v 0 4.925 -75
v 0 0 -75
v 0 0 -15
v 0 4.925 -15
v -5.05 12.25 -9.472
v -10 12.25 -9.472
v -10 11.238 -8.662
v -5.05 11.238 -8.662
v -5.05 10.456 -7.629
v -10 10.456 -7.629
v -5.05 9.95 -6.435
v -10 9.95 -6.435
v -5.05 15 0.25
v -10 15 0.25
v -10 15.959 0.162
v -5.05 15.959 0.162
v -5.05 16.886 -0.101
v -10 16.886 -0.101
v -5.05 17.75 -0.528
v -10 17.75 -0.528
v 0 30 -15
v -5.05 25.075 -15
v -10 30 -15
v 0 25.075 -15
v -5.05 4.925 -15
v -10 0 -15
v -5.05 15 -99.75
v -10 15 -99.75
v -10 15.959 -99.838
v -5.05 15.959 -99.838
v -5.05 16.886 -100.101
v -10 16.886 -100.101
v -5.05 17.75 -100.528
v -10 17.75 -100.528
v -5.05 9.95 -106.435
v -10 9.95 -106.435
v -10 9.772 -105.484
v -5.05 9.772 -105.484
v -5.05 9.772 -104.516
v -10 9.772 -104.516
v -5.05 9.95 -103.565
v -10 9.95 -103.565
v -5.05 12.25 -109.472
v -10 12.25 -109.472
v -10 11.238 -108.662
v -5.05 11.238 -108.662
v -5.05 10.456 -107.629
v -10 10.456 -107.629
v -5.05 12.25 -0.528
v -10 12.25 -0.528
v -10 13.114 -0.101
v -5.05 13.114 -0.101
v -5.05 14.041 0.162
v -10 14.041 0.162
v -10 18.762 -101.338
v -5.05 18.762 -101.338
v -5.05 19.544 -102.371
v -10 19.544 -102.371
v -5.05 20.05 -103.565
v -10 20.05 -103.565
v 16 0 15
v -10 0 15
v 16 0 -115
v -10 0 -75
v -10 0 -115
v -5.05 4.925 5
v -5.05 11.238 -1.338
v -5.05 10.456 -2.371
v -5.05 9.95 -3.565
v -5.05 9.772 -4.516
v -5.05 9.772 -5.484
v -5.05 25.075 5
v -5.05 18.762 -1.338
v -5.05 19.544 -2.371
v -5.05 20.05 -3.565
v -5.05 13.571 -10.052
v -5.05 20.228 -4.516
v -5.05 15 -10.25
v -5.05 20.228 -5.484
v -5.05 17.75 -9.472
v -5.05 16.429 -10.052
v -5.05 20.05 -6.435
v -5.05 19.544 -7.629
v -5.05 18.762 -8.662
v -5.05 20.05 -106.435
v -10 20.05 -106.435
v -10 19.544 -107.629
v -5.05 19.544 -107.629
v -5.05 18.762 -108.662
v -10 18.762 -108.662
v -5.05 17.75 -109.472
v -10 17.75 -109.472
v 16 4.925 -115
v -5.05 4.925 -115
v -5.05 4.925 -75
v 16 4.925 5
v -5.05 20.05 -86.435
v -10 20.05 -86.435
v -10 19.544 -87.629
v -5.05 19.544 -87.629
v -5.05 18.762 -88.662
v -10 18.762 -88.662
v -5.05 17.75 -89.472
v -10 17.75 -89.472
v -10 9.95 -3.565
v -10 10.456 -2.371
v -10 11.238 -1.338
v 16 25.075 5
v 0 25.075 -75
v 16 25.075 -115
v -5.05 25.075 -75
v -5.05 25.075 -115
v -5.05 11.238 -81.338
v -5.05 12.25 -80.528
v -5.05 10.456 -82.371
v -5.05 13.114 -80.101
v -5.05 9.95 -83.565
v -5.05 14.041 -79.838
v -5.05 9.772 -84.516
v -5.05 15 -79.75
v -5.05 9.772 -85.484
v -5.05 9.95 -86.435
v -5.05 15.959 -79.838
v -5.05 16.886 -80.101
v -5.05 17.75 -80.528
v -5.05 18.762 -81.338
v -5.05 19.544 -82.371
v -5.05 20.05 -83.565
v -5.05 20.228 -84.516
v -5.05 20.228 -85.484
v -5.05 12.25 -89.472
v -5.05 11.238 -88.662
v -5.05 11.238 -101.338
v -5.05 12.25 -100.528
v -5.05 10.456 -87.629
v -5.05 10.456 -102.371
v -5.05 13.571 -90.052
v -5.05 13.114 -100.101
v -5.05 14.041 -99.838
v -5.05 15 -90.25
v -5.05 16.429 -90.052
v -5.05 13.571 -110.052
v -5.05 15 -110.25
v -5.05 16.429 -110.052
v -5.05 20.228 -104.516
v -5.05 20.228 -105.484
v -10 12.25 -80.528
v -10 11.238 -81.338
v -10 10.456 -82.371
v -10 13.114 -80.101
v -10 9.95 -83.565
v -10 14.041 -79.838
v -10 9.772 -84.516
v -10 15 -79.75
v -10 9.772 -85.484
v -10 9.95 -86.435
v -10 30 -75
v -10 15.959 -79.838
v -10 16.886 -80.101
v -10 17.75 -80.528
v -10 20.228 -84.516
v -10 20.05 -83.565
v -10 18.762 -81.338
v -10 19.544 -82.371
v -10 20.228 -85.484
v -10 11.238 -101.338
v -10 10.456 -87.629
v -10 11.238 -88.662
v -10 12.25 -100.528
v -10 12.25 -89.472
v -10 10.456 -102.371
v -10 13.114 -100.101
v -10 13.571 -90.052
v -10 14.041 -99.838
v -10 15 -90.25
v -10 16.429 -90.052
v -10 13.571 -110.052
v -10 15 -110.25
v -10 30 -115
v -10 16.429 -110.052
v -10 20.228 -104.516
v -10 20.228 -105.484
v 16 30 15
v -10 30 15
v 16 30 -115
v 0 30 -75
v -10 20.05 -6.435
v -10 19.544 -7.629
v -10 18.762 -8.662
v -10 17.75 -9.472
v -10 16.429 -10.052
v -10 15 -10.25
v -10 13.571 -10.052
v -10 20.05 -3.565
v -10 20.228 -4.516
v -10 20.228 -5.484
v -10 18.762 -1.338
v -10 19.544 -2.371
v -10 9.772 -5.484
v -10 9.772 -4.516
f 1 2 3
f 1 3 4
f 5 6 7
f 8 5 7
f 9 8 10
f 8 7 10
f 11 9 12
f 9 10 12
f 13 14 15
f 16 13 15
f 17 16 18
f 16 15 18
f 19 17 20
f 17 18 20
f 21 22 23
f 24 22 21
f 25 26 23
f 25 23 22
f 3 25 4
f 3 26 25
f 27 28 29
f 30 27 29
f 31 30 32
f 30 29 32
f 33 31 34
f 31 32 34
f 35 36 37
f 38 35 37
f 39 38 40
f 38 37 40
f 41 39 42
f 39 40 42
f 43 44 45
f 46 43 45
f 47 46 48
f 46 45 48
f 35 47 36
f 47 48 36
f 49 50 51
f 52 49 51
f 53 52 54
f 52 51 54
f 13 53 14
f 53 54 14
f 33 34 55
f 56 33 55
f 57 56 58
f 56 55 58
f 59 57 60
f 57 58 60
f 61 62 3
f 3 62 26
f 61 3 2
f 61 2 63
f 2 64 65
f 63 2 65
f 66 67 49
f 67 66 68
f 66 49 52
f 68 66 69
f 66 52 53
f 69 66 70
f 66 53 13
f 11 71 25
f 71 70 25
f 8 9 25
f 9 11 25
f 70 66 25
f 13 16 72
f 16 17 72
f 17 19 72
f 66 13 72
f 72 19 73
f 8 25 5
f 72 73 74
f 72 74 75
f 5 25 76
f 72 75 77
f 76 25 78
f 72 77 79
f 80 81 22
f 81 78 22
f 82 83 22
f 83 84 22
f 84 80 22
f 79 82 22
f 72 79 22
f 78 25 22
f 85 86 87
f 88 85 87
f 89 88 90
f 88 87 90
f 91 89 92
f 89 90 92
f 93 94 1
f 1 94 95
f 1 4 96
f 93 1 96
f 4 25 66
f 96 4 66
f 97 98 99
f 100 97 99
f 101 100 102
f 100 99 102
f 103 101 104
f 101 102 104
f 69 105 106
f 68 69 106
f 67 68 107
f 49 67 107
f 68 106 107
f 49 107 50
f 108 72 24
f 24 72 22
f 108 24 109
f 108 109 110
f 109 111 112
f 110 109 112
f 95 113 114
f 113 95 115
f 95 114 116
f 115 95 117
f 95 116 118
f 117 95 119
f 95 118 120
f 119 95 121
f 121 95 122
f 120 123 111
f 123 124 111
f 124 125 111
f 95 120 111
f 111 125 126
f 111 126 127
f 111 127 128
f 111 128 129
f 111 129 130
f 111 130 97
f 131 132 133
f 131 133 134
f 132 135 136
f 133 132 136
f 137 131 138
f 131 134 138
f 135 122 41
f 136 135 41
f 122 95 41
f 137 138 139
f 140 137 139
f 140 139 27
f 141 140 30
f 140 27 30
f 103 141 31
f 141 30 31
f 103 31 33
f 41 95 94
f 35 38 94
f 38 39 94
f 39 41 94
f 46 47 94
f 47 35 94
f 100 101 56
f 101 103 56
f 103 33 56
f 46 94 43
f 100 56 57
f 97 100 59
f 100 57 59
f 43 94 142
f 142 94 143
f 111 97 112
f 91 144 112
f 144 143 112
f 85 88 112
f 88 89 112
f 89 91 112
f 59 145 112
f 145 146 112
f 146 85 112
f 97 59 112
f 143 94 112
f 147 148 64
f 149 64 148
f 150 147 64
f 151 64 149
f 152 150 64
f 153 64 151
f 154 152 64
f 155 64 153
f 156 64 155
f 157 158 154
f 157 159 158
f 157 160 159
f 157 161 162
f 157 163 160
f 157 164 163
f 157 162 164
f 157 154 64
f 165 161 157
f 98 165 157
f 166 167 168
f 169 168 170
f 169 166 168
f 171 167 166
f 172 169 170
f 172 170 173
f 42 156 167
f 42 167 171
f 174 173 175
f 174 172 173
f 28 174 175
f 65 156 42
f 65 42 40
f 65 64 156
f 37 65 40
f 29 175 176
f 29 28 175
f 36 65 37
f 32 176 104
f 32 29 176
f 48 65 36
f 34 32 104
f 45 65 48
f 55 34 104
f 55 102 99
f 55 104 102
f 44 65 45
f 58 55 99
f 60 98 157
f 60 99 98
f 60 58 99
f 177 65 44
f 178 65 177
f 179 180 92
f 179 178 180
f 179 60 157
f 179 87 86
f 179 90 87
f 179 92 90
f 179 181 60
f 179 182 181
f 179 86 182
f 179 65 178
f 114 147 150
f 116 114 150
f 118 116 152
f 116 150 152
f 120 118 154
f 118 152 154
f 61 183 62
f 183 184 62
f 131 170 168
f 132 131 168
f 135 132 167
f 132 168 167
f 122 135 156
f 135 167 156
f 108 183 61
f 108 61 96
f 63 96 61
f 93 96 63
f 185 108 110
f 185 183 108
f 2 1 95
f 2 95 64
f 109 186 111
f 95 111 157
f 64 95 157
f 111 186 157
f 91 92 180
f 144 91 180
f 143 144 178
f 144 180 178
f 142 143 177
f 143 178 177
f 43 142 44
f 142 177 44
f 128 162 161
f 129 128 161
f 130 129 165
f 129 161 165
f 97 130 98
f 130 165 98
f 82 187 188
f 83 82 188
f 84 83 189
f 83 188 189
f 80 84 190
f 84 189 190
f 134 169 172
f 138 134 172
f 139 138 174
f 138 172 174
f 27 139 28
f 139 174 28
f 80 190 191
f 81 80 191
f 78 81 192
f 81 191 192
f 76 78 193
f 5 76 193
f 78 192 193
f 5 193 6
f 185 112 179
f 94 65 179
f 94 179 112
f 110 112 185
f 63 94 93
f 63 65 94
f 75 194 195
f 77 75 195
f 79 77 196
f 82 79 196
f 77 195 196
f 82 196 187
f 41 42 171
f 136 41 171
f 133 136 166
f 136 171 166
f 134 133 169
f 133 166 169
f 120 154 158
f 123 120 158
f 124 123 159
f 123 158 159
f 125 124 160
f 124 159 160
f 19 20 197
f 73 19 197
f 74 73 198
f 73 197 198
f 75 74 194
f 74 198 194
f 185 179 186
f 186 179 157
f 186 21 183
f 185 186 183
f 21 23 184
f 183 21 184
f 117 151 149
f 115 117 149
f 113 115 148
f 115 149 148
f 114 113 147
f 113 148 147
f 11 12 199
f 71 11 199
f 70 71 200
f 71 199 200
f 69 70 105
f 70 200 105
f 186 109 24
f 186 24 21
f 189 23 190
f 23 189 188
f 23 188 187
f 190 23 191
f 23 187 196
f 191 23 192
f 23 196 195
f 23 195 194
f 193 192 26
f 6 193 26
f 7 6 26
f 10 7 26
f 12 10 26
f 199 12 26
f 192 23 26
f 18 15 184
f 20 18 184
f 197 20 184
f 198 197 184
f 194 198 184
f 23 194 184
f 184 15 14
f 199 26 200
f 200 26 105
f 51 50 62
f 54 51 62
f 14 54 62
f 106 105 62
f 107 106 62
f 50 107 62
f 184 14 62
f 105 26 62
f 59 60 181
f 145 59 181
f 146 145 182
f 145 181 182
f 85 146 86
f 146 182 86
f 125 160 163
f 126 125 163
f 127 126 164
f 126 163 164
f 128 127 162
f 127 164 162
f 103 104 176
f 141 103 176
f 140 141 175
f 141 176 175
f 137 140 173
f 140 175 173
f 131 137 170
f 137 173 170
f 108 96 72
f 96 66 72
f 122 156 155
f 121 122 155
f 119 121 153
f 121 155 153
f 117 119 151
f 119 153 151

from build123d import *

# Parameters (mm, degrees)
SKETCH_1_W          = 30
SKETCH_1_H          = 30
EXTRUDE_1_DEPTH     = 30
SKETCH_2_W          = 20
SKETCH_2_H          = 20.05
CUT_EXTRUDE_1_DEPTH = 20
CUT_EXTRUDE_2_DEPTH = 20
SKETCH_4_W          = 5
SKETCH_4_H          = 30
CUT_EXTRUDE_3_DEPTH = 55
SKETCH_5_W          = 15
SKETCH_5_H          = 4.975
EXTRUDE_2_DEPTH     = 120
EXTRUDE_3_DEPTH     = 60
SKETCH_7_R          = 3.1
CUT_EXTRUDE_4_DEPTH = 60
CUT_EXTRUDE_5_REACH = 155.704
SKETCH_8_W          = 20.1
SKETCH_8_H          = 20.15
EXTRUDE_4_DEPTH     = 1
SKETCH_10_R         = 3.1
CUT_EXTRUDE_6_DEPTH = 10
SKETCH_12_W         = 26
SKETCH_12_H         = 20
CUT_EXTRUDE_8_DEPTH = 87


with BuildPart() as part:
    # 草图1 → 凸台-拉伸1 (new body)
    with BuildSketch(Plane(origin=(0, 0, 0), x_dir=(1, 0, 0), z_dir=(0, 1, 0))):
        Rectangle(SKETCH_1_W, SKETCH_1_H)
    extrude(amount=EXTRUDE_1_DEPTH)

    # 草图2 → 切除-拉伸1 (cut)
    with BuildSketch(Plane(origin=(15, 0, 0), x_dir=(0, 0, -1), z_dir=(1, 0, 0))):
        with Locations((5, 15)):
            Rectangle(SKETCH_2_W, SKETCH_2_H)
    extrude(amount=-CUT_EXTRUDE_1_DEPTH, mode=Mode.SUBTRACT)

    # 草图3 → 切除-拉伸2 (cut)
    with BuildSketch(Plane(origin=(-5, 0, 0), x_dir=(0, 0, -1), z_dir=(1, 0, 0))):
        with BuildLine():
            ThreePointArc((7.189292698, 17.194765929), (5, 18.1), (2.810707302, 17.194765929))
            Line((2.810707302, 17.194765929), (5, 15))
            Line((5, 15), (7.189292698, 17.194765929))
        make_face()
        with BuildLine():
            Line((5, 15), (2.810707302, 17.194765929))
            ThreePointArc((2.810707302, 17.194765929), (1.9, 15), (2.810707302, 12.805234071))
            Line((2.810707302, 12.805234071), (5, 15))
        make_face()
        with BuildLine():
            Line((7.189292698, 17.194765929), (5, 15))
            Line((5, 15), (7.189292698, 12.805234071))
            ThreePointArc((7.189292698, 12.805234071), (7.86328547, 13.81189381), (8.1, 15))
            ThreePointArc((8.1, 15), (7.86328547, 16.18810619), (7.189292698, 17.194765929))
        make_face()
        with BuildLine():
            Line((7.189292698, 12.805234071), (5, 15))
            Line((5, 15), (2.810707302, 12.805234071))
            ThreePointArc((2.810707302, 12.805234071), (5, 11.9), (7.189292698, 12.805234071))
        make_face()
        with BuildLine():
            ThreePointArc((7.189292698, 17.194765929), (5, 18.1), (2.810707302, 17.194765929))
            Line((2.810707302, 17.194765929), (5, 15))
            Line((5, 15), (7.189292698, 17.194765929))
        make_face()
        with BuildLine():
            Line((5, 15), (2.810707302, 17.194765929))
            ThreePointArc((2.810707302, 17.194765929), (1.9, 15), (2.810707302, 12.805234071))
            Line((2.810707302, 12.805234071), (5, 15))
        make_face()
        with BuildLine():
            Line((7.189292698, 17.194765929), (5, 15))
            Line((5, 15), (7.189292698, 12.805234071))
            ThreePointArc((7.189292698, 12.805234071), (7.86328547, 13.81189381), (8.1, 15))
            ThreePointArc((8.1, 15), (7.86328547, 16.18810619), (7.189292698, 17.194765929))
        make_face()
        with BuildLine():
            Line((7.189292698, 12.805234071), (5, 15))
            Line((5, 15), (2.810707302, 12.805234071))
            ThreePointArc((2.810707302, 12.805234071), (5, 11.9), (7.189292698, 12.805234071))
        make_face()
        with BuildLine():
            ThreePointArc((7.189292698, 17.194765929), (5, 18.1), (2.810707302, 17.194765929))
            Line((2.810707302, 17.194765929), (5, 15))
            Line((5, 15), (7.189292698, 17.194765929))
        make_face()
        with BuildLine():
            Line((5, 15), (2.810707302, 17.194765929))
            ThreePointArc((2.810707302, 17.194765929), (1.9, 15), (2.810707302, 12.805234071))
            Line((2.810707302, 12.805234071), (5, 15))
        make_face()
        with BuildLine():
            Line((7.189292698, 17.194765929), (5, 15))
            Line((5, 15), (7.189292698, 12.805234071))
            ThreePointArc((7.189292698, 12.805234071), (7.86328547, 13.81189381), (8.1, 15))
            ThreePointArc((8.1, 15), (7.86328547, 16.18810619), (7.189292698, 17.194765929))
        make_face()
        with BuildLine():
            Line((7.189292698, 12.805234071), (5, 15))
            Line((5, 15), (2.810707302, 12.805234071))
            ThreePointArc((2.810707302, 12.805234071), (5, 11.9), (7.189292698, 12.805234071))
        make_face()
        with BuildLine():
            ThreePointArc((7.189292698, 17.194765929), (5, 18.1), (2.810707302, 17.194765929))
            Line((2.810707302, 17.194765929), (5, 15))
            Line((5, 15), (7.189292698, 17.194765929))
        make_face()
        with BuildLine():
            Line((5, 15), (2.810707302, 17.194765929))
            ThreePointArc((2.810707302, 17.194765929), (1.9, 15), (2.810707302, 12.805234071))
            Line((2.810707302, 12.805234071), (5, 15))
        make_face()
        with BuildLine():
            Line((7.189292698, 17.194765929), (5, 15))
            Line((5, 15), (7.189292698, 12.805234071))
            ThreePointArc((7.189292698, 12.805234071), (7.86328547, 13.81189381), (8.1, 15))
            ThreePointArc((8.1, 15), (7.86328547, 16.18810619), (7.189292698, 17.194765929))
        make_face()
        with BuildLine():
            Line((7.189292698, 12.805234071), (5, 15))
            Line((5, 15), (2.810707302, 12.805234071))
            ThreePointArc((2.810707302, 12.805234071), (5, 11.9), (7.189292698, 12.805234071))
        make_face()
    extrude(amount=-CUT_EXTRUDE_2_DEPTH, mode=Mode.SUBTRACT)

    # 草图4 → 切除-拉伸3 (cut)
    with BuildSketch(Plane.XZ):
        with Locations((-12.5, 0)):
            Rectangle(SKETCH_4_W, SKETCH_4_H)
    extrude(amount=-CUT_EXTRUDE_3_DEPTH, mode=Mode.SUBTRACT)

    # 草图5 → 凸台-拉伸2 (add)
    with BuildSketch(Plane(origin=(0, 0, -15), x_dir=(-1, 0, 0), z_dir=(0, 0, -1))):
        with Locations((-7.5, 27.5125)):
            Rectangle(SKETCH_5_W, SKETCH_5_H)
        with Locations((-7.5, 2.4875)):
            Rectangle(SKETCH_5_W, SKETCH_5_H)
    extrude(amount=EXTRUDE_2_DEPTH)

    # 草图6 → 凸台-拉伸3 (add)
    with BuildSketch(Plane(origin=(0, 0, -135), x_dir=(-1, 0, 0), z_dir=(0, 0, -1))):
        Polygon((5, 4.975), (0, 4.975), (0, 0), (10, 0), (10, 30), (0, 30), (0, 25.025), (5, 25.025), align=None)
    extrude(amount=-EXTRUDE_3_DEPTH)

    # 草图7 → 切除-拉伸4 (cut)
    with BuildSketch(Plane.ZY.offset(10)):
        with Locations((-85, 15)):
            Circle(SKETCH_7_R)
    extrude(amount=-CUT_EXTRUDE_4_DEPTH, mode=Mode.SUBTRACT)

    # 切除-拉伸5: up to this face of the body (flat: up to its plane)
    cut_extrude_5_end = Plane(part.part.faces().sort_by_distance((5, 15, 5))[0])
    # 草图8 → 切除-拉伸5 (cut, up to the picked face)
    with BuildSketch(Plane(origin=(0, 0, -135), x_dir=(-1, 0, 0), z_dir=(0, 0, -1)), mode=Mode.PRIVATE) as cut_extrude_5_sk1:
        with Locations((-5, 15)):
            Rectangle(SKETCH_8_W, SKETCH_8_H)
    cut_extrude_5_tool1 = split(extrude(cut_extrude_5_sk1.sketch, amount=-CUT_EXTRUDE_5_REACH, mode=Mode.PRIVATE), bisect_by=cut_extrude_5_end, keep=Keep.BOTH, mode=Mode.PRIVATE)
    add(cut_extrude_5_tool1.solids().sort_by(Axis((5, 15, -135), (0, 0, 1)))[0], mode=Mode.SUBTRACT)

    # 草图9 → 凸台-拉伸4 (add)
    with BuildSketch(Plane(origin=(15, 0, 0), x_dir=(0, 0, -1), z_dir=(1, 0, 0))):
        Polygon((135, 4.925), (-5, 4.925), (-5, 25.075), (135, 25.075), (135, 30), (-15, 30), (-15, 0), (135, 0), align=None)
    extrude(amount=EXTRUDE_4_DEPTH)

    # 草图10 → 切除-拉伸6 (cut)
    # profile 1 of 9: a face of its own
    with BuildSketch(Plane.ZY.offset(10)):
        with BuildLine():
            ThreePointArc((-99.75, 15), (-99.948207558, 16.428948256), (-100.527864045, 17.75))
            ThreePointArc((-100.527864045, 17.75), (-101.830321577, 19.185168897), (-103.564729991, 20.05))
            Line((-103.564729991, 20.05), (-106.435270009, 20.05))
            ThreePointArc((-106.435270009, 20.05), (-108.169678423, 19.185168897), (-109.472135955, 17.75))
            ThreePointArc((-109.472135955, 17.75), (-110.25, 15), (-109.472135955, 12.25))
            ThreePointArc((-109.472135955, 12.25), (-108.169678423, 10.814831103), (-106.435270009, 9.95))
            Line((-106.435270009, 9.95), (-103.564729991, 9.95))
            ThreePointArc((-103.564729991, 9.95), (-101.830321577, 10.814831103), (-100.527864045, 12.25))
            ThreePointArc((-100.527864045, 12.25), (-99.948207558, 13.571051744), (-99.75, 15))
        make_face()
    # profile 2 of 9: a face of its own
    with BuildSketch(Plane.ZY.offset(10)):
        with BuildLine():
            Line((-106.435270009, 20.05), (-103.564729991, 20.05))
            ThreePointArc((-103.564729991, 20.05), (-105, 20.25), (-106.435270009, 20.05))
        make_face()
    # profile 3 of 9: a face of its own
    with BuildSketch(Plane.ZY.offset(10)):
        with BuildLine():
            ThreePointArc((-106.435270009, 9.95), (-105, 9.75), (-103.564729991, 9.95))
            Line((-103.564729991, 9.95), (-106.435270009, 9.95))
        make_face()
    # profile 4 of 9: a face of its own
    with BuildSketch(Plane.ZY.offset(10)):
        with BuildLine():
            ThreePointArc((-79.75, 15), (-79.948207558, 16.428948256), (-80.527864045, 17.75))
            ThreePointArc((-80.527864045, 17.75), (-81.830321577, 19.185168897), (-83.564729991, 20.05))
            Line((-83.564729991, 20.05), (-86.435270009, 20.05))
            ThreePointArc((-86.435270009, 20.05), (-88.169678423, 19.185168897), (-89.472135955, 17.75))
            ThreePointArc((-89.472135955, 17.75), (-90.25, 15), (-89.472135955, 12.25))
            ThreePointArc((-89.472135955, 12.25), (-88.169678423, 10.814831103), (-86.435270009, 9.95))
            Line((-86.435270009, 9.95), (-83.564729991, 9.95))
            ThreePointArc((-83.564729991, 9.95), (-81.830321577, 10.814831103), (-80.527864045, 12.25))
            ThreePointArc((-80.527864045, 12.25), (-79.948207558, 13.571051744), (-79.75, 15))
        make_face()
        with Locations((-85, 15)):
            Circle(SKETCH_10_R, mode=Mode.SUBTRACT)
    # profile 5 of 9: a face of its own
    with BuildSketch(Plane.ZY.offset(10)):
        with BuildLine():
            Line((-86.435270009, 20.05), (-83.564729991, 20.05))
            ThreePointArc((-83.564729991, 20.05), (-85, 20.25), (-86.435270009, 20.05))
        make_face()
    # profile 6 of 9: a face of its own
    with BuildSketch(Plane.ZY.offset(10)):
        with BuildLine():
            ThreePointArc((-86.435270009, 9.95), (-85, 9.75), (-83.564729991, 9.95))
            Line((-83.564729991, 9.95), (-86.435270009, 9.95))
        make_face()
    # profile 7 of 9: a face of its own
    with BuildSketch(Plane.ZY.offset(10)):
        with BuildLine():
            ThreePointArc((0.25, 15), (0.051792442, 16.428948256), (-0.527864045, 17.75))
            ThreePointArc((-0.527864045, 17.75), (-1.830321577, 19.185168897), (-3.564729991, 20.05))
            Line((-3.564729991, 20.05), (-6.435270009, 20.05))
            ThreePointArc((-6.435270009, 20.05), (-8.169678423, 19.185168897), (-9.472135955, 17.75))
            ThreePointArc((-9.472135955, 17.75), (-10.25, 15), (-9.472135955, 12.25))
            ThreePointArc((-9.472135955, 12.25), (-8.169678423, 10.814831103), (-6.435270009, 9.95))
            Line((-6.435270009, 9.95), (-3.564729991, 9.95))
            ThreePointArc((-3.564729991, 9.95), (-1.830321577, 10.814831103), (-0.527864045, 12.25))
            ThreePointArc((-0.527864045, 12.25), (0.051792442, 13.571051744), (0.25, 15))
        make_face()
    # profile 8 of 9: a face of its own
    with BuildSketch(Plane.ZY.offset(10)):
        with BuildLine():
            Line((-6.435270009, 20.05), (-3.564729991, 20.05))
            ThreePointArc((-3.564729991, 20.05), (-5, 20.25), (-6.435270009, 20.05))
        make_face()
    # profile 9 of 9: a face of its own
    with BuildSketch(Plane.ZY.offset(10)):
        with BuildLine():
            ThreePointArc((-6.435270009, 9.95), (-5, 9.75), (-3.564729991, 9.95))
            Line((-3.564729991, 9.95), (-6.435270009, 9.95))
        make_face()
    extrude(amount=-CUT_EXTRUDE_6_DEPTH, mode=Mode.SUBTRACT)

    # 草图12 → 切除-拉伸8 (cut)
    with BuildSketch(Plane.XZ):
        with Locations((3, -125)):
            Rectangle(SKETCH_12_W, SKETCH_12_H)
    extrude(amount=-CUT_EXTRUDE_8_DEPTH, mode=Mode.SUBTRACT)


solid = part.part
